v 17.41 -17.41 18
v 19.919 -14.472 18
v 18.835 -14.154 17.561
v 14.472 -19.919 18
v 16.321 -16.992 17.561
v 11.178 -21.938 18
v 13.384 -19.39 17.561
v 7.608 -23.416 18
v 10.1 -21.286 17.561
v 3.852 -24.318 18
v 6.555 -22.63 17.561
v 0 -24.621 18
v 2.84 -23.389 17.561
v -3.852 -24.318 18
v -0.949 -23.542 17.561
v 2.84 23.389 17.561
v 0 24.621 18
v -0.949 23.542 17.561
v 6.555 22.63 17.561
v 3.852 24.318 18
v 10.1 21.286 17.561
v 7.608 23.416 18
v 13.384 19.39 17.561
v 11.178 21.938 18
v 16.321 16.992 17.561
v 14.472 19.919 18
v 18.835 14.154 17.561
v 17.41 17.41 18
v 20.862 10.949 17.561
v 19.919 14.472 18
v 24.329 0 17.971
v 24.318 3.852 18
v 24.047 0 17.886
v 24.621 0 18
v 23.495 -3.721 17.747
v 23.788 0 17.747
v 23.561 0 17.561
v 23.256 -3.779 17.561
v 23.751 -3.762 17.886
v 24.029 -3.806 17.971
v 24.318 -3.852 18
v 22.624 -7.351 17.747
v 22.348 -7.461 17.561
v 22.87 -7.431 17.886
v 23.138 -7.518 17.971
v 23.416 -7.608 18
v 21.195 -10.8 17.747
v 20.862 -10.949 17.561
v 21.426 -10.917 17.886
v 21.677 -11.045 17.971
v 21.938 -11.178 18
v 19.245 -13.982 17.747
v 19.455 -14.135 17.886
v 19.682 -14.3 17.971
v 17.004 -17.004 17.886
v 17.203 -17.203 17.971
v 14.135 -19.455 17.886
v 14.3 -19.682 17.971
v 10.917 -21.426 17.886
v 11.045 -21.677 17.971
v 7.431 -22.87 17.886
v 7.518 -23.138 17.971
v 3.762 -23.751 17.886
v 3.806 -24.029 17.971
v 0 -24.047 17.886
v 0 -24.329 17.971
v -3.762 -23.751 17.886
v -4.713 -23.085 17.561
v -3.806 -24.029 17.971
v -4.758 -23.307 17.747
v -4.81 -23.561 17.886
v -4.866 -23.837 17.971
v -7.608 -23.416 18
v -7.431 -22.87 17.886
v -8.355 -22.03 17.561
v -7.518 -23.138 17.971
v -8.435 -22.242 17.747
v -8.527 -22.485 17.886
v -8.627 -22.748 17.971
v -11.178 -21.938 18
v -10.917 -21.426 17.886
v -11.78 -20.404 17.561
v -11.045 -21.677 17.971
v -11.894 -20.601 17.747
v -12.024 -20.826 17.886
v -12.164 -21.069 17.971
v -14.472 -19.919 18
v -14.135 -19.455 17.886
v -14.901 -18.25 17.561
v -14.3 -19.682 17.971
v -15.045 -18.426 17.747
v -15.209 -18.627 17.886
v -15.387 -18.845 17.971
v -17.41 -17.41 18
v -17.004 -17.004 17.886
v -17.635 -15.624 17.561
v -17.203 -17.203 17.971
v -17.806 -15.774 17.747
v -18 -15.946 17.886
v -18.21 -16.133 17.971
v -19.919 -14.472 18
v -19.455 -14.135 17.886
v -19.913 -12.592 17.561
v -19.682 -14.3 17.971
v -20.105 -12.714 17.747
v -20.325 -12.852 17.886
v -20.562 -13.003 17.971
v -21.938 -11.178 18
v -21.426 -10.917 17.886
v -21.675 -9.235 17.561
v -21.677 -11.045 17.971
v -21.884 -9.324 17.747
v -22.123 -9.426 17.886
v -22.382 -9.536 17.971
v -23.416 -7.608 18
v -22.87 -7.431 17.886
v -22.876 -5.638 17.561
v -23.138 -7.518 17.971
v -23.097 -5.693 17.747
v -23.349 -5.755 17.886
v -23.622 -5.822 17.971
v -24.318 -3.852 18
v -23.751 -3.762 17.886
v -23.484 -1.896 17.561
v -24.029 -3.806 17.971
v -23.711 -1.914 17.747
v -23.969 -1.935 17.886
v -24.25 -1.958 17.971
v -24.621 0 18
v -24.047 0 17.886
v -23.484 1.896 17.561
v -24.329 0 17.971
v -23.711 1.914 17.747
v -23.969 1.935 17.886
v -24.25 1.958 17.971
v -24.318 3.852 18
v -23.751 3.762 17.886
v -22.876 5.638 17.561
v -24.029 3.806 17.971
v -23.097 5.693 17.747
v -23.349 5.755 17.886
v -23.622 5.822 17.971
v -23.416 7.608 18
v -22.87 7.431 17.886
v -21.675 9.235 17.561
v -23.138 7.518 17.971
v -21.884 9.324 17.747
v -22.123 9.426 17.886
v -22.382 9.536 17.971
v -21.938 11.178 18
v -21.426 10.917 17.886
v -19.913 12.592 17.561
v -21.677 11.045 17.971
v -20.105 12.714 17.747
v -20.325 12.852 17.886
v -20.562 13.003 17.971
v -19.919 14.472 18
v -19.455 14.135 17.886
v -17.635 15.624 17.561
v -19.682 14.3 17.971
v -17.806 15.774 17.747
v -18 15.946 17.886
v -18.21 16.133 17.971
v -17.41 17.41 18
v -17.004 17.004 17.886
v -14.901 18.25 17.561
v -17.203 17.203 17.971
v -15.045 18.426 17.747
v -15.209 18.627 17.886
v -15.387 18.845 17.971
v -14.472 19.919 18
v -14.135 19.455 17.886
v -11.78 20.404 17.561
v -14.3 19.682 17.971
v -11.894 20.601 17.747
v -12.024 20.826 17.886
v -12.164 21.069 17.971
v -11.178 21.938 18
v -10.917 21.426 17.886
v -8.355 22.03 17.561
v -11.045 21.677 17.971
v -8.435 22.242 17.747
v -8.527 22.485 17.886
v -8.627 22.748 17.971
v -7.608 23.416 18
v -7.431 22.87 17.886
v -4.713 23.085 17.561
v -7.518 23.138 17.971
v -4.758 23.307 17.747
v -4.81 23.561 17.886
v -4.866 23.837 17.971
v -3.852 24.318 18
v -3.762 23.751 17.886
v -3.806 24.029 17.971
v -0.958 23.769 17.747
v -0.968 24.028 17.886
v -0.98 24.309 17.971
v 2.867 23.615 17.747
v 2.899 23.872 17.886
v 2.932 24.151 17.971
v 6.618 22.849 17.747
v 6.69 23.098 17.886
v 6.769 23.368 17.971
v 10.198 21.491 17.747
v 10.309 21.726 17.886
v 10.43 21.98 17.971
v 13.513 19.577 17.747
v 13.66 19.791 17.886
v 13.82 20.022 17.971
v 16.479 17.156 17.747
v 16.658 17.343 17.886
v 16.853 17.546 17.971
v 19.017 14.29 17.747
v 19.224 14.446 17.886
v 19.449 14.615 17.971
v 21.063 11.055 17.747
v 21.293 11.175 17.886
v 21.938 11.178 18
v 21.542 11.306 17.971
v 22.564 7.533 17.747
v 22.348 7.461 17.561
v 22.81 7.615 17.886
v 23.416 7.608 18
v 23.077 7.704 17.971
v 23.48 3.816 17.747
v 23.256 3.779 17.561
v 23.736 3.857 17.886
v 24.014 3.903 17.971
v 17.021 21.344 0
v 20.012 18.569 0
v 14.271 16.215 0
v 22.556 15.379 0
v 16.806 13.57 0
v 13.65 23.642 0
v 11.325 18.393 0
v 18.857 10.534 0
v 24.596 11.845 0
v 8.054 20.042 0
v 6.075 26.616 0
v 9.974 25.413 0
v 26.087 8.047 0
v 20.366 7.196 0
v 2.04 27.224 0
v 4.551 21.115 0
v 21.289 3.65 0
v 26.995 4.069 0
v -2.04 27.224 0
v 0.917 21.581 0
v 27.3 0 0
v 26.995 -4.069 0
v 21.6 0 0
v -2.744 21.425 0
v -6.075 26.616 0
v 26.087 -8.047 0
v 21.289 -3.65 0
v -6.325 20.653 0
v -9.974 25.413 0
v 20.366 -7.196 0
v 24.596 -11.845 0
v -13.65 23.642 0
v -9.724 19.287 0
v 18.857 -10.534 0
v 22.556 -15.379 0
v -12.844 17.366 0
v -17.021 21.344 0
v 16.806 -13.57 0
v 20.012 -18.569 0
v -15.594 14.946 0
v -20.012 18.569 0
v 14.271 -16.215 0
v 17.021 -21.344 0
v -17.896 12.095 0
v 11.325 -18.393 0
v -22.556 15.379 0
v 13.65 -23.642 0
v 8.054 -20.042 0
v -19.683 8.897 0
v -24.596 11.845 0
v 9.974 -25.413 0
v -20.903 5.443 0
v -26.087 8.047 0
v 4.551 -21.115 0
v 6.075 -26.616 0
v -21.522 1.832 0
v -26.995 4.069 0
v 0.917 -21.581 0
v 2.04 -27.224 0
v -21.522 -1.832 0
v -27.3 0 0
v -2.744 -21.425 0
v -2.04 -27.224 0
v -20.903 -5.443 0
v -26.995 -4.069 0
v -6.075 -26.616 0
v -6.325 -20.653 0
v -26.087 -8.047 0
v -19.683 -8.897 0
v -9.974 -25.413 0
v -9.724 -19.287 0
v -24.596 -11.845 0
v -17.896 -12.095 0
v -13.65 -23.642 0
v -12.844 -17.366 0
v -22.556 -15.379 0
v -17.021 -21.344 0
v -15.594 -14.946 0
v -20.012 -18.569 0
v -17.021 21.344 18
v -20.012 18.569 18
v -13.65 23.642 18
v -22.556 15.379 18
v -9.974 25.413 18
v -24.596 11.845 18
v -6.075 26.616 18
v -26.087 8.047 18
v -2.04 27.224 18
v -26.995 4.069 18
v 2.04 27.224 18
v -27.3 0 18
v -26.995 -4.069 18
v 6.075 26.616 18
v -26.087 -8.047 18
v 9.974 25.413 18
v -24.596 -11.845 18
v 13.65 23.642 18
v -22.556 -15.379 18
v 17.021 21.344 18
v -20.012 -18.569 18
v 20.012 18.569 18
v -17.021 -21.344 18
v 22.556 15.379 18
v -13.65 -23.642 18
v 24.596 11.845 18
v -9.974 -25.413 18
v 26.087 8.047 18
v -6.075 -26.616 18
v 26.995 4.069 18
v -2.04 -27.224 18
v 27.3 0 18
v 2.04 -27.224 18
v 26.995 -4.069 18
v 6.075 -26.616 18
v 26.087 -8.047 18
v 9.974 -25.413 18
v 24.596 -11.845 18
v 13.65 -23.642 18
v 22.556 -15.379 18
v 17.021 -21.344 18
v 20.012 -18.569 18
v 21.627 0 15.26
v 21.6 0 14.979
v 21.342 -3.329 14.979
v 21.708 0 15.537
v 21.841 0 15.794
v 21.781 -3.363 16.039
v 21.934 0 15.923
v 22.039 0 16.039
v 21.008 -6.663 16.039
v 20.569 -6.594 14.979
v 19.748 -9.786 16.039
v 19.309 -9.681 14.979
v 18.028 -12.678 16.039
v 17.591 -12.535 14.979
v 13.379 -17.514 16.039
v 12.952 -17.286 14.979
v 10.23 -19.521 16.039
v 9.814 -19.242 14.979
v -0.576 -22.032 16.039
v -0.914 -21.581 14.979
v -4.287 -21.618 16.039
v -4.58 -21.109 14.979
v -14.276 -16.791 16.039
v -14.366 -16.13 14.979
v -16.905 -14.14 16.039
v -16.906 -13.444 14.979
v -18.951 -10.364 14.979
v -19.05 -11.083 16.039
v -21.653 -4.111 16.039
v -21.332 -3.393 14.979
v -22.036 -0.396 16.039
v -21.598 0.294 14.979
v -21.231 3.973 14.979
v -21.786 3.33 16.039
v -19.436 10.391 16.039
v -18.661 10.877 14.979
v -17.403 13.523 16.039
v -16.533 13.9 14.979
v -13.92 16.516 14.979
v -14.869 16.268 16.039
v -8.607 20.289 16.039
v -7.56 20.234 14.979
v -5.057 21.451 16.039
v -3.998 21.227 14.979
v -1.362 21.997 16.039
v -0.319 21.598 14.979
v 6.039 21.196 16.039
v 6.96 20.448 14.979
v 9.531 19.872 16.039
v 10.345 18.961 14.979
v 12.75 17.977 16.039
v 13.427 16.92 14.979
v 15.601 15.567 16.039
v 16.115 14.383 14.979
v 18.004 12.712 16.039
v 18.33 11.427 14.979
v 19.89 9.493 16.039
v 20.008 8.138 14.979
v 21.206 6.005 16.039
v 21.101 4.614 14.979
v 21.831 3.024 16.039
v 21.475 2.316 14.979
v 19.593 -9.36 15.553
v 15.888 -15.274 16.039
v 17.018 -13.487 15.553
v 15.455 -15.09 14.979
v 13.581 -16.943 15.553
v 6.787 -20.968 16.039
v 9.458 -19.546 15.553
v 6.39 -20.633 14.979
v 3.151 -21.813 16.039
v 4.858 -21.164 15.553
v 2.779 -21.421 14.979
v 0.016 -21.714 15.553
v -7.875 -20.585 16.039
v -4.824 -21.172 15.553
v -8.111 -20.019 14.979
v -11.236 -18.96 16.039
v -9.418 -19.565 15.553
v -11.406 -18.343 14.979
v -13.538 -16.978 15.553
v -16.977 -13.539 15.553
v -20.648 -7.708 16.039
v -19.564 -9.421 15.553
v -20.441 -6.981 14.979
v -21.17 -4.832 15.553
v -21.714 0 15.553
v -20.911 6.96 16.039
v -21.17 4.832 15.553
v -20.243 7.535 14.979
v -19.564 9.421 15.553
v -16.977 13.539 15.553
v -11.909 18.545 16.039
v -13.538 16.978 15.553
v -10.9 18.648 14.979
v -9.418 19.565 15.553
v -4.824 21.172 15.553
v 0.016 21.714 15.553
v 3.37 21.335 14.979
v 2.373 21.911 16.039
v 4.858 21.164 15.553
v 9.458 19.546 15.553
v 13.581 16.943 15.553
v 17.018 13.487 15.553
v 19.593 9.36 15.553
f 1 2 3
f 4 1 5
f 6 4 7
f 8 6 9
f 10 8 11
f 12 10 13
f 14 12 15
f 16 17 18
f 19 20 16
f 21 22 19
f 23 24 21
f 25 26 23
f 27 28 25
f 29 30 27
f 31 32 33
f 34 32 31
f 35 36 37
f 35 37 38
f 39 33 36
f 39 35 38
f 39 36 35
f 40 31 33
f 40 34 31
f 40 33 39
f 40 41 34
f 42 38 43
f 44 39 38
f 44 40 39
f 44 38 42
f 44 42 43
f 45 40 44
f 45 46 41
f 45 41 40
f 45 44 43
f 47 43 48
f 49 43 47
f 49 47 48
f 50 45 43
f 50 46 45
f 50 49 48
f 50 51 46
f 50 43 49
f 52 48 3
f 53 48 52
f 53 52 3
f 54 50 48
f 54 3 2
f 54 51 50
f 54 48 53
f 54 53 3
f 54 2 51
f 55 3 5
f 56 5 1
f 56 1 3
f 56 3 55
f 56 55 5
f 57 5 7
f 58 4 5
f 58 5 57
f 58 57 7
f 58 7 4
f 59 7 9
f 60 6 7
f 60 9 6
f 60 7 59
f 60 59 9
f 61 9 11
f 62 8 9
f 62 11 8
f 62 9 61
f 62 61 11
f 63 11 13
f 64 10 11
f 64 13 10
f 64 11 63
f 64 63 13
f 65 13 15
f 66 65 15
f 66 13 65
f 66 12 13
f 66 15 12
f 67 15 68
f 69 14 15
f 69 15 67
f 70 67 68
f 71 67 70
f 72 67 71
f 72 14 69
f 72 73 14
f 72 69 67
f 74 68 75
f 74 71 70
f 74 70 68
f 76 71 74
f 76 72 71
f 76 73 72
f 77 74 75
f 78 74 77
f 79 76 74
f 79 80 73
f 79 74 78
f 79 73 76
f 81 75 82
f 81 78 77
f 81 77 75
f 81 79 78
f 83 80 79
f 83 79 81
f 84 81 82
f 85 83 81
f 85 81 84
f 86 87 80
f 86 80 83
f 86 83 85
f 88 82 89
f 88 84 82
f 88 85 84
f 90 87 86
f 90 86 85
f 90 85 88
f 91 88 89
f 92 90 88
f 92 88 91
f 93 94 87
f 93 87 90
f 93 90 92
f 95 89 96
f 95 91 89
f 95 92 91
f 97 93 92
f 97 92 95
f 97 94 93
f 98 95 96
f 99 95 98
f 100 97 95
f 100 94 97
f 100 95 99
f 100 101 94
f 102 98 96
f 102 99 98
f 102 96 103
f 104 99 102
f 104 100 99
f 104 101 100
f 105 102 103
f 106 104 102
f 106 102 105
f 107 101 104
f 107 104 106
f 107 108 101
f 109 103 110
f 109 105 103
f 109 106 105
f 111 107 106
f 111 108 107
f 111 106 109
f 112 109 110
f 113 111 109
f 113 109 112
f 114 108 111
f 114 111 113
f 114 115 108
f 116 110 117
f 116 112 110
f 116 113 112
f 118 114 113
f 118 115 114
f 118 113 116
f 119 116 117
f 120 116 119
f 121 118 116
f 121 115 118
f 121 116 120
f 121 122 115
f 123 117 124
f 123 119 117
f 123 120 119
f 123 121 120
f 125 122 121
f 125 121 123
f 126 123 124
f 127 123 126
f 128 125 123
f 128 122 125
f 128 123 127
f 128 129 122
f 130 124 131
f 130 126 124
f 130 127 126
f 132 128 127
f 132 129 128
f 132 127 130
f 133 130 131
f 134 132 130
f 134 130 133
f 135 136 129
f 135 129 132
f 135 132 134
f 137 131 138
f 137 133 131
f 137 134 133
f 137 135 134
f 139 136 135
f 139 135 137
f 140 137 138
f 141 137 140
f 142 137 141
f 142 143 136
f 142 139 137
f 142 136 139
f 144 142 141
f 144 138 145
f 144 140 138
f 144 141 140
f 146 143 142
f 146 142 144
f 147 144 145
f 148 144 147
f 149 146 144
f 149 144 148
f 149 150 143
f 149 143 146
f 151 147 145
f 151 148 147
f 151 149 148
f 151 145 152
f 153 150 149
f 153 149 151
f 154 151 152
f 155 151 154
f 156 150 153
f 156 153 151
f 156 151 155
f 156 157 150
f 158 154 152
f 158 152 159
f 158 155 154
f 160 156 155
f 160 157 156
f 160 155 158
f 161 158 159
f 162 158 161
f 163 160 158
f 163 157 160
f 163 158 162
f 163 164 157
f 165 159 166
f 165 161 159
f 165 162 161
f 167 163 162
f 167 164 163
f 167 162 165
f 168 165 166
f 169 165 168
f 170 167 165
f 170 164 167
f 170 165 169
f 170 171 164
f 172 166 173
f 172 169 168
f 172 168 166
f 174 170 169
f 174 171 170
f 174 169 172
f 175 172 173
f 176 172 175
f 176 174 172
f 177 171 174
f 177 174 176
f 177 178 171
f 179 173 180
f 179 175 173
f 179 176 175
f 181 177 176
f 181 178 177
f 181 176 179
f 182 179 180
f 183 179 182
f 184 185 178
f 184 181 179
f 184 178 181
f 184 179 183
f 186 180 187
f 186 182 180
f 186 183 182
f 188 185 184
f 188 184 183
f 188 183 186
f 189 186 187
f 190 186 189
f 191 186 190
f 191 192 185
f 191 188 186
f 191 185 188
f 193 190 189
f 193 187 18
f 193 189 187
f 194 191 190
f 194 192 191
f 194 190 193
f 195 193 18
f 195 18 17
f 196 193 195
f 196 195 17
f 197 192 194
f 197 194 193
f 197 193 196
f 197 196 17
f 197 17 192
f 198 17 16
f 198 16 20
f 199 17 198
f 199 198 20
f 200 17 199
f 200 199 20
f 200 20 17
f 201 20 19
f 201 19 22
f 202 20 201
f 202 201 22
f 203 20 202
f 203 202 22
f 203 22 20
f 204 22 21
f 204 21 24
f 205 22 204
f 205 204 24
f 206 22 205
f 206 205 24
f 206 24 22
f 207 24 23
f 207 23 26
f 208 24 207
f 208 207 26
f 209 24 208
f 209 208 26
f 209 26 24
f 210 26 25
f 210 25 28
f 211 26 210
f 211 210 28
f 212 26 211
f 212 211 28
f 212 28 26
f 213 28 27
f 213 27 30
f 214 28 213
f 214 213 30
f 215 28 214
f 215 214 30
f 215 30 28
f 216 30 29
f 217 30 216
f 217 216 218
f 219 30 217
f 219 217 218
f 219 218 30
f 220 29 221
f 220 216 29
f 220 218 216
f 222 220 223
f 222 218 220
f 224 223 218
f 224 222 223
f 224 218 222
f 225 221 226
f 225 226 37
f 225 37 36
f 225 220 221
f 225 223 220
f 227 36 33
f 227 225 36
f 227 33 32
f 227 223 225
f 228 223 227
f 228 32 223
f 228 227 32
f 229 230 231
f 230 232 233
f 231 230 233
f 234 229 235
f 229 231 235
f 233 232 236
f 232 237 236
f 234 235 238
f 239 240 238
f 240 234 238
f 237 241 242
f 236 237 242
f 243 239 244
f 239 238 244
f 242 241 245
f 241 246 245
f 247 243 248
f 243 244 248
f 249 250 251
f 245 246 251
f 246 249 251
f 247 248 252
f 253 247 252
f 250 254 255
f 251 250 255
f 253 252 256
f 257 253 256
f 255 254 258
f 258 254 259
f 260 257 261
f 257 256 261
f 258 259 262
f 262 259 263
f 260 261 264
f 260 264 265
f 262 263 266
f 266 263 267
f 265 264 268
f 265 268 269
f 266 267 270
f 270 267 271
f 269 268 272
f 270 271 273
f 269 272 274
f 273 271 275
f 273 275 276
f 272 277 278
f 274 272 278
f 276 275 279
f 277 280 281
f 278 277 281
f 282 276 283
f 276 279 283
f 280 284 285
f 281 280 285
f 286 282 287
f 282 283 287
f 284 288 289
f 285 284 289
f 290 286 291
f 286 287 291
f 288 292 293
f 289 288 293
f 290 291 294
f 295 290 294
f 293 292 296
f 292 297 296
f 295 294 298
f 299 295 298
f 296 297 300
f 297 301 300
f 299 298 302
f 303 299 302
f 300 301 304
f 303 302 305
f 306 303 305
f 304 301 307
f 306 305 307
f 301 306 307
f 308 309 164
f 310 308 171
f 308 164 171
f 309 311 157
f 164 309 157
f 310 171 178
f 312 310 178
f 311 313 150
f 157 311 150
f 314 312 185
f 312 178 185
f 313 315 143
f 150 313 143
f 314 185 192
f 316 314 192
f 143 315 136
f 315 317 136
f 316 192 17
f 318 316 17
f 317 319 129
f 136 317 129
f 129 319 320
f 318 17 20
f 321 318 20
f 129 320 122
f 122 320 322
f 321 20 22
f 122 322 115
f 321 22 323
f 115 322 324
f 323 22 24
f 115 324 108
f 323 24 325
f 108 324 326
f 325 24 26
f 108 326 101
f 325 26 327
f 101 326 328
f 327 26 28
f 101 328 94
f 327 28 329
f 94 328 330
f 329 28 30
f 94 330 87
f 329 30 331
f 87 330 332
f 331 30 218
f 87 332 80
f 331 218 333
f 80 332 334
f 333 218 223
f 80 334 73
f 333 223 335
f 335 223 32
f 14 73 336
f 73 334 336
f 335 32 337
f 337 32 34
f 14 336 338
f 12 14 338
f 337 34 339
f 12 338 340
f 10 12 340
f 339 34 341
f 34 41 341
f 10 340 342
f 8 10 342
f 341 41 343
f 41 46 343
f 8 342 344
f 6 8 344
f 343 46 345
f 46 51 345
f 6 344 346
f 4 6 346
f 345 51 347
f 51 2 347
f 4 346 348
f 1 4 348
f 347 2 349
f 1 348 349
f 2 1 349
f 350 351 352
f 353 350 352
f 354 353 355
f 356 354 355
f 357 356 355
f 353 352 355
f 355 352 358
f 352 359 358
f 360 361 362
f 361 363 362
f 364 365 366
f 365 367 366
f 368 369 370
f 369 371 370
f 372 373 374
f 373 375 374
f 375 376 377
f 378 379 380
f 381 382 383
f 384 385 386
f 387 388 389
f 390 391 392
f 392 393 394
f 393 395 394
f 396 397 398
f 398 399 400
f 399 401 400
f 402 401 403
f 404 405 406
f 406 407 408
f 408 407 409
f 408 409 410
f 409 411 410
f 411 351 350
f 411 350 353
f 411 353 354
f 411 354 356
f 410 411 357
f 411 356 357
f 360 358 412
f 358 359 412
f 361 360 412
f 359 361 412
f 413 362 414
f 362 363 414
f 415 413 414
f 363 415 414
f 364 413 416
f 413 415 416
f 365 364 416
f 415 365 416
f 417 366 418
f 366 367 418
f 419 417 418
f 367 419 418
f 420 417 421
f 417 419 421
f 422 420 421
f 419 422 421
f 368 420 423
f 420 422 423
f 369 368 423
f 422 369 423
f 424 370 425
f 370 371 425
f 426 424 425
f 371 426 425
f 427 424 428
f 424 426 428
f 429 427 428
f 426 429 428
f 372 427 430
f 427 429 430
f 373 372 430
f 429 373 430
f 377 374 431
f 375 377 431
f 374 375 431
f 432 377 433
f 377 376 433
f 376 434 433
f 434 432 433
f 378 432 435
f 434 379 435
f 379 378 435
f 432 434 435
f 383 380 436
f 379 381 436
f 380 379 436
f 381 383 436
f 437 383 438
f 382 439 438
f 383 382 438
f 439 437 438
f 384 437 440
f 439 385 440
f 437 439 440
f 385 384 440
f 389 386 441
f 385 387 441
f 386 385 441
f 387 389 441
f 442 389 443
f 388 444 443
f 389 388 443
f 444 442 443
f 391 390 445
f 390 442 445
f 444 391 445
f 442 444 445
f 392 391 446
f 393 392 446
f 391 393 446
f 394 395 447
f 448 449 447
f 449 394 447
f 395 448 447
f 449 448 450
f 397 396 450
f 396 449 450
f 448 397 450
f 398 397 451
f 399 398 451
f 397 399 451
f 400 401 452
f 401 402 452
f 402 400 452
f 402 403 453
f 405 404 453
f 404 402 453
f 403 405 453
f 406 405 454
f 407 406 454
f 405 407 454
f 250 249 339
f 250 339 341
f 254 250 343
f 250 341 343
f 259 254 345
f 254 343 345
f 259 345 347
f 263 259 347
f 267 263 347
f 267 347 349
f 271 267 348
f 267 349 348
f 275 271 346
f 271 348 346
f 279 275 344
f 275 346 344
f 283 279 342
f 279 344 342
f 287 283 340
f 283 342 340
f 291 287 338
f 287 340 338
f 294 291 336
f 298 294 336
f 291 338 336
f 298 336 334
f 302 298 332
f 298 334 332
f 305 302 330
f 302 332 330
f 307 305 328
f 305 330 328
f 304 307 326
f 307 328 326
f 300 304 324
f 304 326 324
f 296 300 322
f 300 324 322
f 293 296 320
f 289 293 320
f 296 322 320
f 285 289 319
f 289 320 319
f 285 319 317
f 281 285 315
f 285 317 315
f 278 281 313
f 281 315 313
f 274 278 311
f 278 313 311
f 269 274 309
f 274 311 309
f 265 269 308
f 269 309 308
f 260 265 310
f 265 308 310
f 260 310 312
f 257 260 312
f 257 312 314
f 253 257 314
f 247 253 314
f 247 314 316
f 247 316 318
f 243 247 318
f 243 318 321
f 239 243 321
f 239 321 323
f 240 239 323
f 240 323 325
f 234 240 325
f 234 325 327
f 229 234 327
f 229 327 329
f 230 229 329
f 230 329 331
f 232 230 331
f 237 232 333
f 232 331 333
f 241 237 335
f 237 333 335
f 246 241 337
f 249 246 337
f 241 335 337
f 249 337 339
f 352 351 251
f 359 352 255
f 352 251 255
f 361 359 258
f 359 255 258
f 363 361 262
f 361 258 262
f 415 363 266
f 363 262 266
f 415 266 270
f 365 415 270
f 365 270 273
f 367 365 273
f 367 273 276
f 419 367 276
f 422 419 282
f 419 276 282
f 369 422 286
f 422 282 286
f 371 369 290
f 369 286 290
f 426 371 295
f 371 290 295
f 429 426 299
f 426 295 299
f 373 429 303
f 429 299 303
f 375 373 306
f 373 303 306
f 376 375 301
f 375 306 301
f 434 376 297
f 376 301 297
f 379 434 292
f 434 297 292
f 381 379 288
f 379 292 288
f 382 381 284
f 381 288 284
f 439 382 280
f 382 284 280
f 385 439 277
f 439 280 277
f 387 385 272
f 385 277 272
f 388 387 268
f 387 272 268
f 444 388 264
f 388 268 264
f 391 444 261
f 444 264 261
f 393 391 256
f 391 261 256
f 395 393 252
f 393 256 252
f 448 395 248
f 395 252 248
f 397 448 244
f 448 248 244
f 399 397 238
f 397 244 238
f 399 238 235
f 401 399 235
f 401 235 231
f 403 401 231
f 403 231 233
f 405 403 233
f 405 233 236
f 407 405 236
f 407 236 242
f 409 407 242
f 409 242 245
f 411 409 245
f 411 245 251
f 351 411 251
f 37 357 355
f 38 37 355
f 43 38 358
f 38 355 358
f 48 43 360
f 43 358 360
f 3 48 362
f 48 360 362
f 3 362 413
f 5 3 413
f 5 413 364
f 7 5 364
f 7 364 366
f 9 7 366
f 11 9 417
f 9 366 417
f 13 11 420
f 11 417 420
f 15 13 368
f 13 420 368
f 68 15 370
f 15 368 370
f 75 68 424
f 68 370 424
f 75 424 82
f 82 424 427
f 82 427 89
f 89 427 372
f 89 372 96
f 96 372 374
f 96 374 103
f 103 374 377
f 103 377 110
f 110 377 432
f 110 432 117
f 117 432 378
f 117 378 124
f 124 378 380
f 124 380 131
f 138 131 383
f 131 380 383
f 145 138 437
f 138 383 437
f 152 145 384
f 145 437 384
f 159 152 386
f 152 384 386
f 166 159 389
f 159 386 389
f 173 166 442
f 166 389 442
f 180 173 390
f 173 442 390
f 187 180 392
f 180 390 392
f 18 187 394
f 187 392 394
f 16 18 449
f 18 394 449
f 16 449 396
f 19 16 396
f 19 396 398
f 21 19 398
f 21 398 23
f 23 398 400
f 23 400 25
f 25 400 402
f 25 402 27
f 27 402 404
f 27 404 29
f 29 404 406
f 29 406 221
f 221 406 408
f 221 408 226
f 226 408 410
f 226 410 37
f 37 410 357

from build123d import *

# Parameters (mm, degrees)
F2_R = 1.5
F3_R = 1.5


with BuildPart() as f1:
    # F0 (on Front) → F1 (revolve)
    with BuildSketch(Plane.XZ):
        Polygon((21.6, 15.6), (21.6, 0), (27.3, 0), (27.3, 18), (24, 18), align=None)
    revolve(axis=Axis((0, 0, 4.861747), (0, 0, -1)))

    # F2
    f2_edges = [f1.edges().sort_by_distance(p)[0] for p in [
        (-21.6, 0, 15.6),
    ]]
    fillet(f2_edges, radius=F2_R)

    # F3
    f3_edges = [f1.edges().sort_by_distance(p)[0] for p in [
        (-24, 0, 18),
    ]]
    fillet(f3_edges, radius=F3_R)


solid = f1.part
